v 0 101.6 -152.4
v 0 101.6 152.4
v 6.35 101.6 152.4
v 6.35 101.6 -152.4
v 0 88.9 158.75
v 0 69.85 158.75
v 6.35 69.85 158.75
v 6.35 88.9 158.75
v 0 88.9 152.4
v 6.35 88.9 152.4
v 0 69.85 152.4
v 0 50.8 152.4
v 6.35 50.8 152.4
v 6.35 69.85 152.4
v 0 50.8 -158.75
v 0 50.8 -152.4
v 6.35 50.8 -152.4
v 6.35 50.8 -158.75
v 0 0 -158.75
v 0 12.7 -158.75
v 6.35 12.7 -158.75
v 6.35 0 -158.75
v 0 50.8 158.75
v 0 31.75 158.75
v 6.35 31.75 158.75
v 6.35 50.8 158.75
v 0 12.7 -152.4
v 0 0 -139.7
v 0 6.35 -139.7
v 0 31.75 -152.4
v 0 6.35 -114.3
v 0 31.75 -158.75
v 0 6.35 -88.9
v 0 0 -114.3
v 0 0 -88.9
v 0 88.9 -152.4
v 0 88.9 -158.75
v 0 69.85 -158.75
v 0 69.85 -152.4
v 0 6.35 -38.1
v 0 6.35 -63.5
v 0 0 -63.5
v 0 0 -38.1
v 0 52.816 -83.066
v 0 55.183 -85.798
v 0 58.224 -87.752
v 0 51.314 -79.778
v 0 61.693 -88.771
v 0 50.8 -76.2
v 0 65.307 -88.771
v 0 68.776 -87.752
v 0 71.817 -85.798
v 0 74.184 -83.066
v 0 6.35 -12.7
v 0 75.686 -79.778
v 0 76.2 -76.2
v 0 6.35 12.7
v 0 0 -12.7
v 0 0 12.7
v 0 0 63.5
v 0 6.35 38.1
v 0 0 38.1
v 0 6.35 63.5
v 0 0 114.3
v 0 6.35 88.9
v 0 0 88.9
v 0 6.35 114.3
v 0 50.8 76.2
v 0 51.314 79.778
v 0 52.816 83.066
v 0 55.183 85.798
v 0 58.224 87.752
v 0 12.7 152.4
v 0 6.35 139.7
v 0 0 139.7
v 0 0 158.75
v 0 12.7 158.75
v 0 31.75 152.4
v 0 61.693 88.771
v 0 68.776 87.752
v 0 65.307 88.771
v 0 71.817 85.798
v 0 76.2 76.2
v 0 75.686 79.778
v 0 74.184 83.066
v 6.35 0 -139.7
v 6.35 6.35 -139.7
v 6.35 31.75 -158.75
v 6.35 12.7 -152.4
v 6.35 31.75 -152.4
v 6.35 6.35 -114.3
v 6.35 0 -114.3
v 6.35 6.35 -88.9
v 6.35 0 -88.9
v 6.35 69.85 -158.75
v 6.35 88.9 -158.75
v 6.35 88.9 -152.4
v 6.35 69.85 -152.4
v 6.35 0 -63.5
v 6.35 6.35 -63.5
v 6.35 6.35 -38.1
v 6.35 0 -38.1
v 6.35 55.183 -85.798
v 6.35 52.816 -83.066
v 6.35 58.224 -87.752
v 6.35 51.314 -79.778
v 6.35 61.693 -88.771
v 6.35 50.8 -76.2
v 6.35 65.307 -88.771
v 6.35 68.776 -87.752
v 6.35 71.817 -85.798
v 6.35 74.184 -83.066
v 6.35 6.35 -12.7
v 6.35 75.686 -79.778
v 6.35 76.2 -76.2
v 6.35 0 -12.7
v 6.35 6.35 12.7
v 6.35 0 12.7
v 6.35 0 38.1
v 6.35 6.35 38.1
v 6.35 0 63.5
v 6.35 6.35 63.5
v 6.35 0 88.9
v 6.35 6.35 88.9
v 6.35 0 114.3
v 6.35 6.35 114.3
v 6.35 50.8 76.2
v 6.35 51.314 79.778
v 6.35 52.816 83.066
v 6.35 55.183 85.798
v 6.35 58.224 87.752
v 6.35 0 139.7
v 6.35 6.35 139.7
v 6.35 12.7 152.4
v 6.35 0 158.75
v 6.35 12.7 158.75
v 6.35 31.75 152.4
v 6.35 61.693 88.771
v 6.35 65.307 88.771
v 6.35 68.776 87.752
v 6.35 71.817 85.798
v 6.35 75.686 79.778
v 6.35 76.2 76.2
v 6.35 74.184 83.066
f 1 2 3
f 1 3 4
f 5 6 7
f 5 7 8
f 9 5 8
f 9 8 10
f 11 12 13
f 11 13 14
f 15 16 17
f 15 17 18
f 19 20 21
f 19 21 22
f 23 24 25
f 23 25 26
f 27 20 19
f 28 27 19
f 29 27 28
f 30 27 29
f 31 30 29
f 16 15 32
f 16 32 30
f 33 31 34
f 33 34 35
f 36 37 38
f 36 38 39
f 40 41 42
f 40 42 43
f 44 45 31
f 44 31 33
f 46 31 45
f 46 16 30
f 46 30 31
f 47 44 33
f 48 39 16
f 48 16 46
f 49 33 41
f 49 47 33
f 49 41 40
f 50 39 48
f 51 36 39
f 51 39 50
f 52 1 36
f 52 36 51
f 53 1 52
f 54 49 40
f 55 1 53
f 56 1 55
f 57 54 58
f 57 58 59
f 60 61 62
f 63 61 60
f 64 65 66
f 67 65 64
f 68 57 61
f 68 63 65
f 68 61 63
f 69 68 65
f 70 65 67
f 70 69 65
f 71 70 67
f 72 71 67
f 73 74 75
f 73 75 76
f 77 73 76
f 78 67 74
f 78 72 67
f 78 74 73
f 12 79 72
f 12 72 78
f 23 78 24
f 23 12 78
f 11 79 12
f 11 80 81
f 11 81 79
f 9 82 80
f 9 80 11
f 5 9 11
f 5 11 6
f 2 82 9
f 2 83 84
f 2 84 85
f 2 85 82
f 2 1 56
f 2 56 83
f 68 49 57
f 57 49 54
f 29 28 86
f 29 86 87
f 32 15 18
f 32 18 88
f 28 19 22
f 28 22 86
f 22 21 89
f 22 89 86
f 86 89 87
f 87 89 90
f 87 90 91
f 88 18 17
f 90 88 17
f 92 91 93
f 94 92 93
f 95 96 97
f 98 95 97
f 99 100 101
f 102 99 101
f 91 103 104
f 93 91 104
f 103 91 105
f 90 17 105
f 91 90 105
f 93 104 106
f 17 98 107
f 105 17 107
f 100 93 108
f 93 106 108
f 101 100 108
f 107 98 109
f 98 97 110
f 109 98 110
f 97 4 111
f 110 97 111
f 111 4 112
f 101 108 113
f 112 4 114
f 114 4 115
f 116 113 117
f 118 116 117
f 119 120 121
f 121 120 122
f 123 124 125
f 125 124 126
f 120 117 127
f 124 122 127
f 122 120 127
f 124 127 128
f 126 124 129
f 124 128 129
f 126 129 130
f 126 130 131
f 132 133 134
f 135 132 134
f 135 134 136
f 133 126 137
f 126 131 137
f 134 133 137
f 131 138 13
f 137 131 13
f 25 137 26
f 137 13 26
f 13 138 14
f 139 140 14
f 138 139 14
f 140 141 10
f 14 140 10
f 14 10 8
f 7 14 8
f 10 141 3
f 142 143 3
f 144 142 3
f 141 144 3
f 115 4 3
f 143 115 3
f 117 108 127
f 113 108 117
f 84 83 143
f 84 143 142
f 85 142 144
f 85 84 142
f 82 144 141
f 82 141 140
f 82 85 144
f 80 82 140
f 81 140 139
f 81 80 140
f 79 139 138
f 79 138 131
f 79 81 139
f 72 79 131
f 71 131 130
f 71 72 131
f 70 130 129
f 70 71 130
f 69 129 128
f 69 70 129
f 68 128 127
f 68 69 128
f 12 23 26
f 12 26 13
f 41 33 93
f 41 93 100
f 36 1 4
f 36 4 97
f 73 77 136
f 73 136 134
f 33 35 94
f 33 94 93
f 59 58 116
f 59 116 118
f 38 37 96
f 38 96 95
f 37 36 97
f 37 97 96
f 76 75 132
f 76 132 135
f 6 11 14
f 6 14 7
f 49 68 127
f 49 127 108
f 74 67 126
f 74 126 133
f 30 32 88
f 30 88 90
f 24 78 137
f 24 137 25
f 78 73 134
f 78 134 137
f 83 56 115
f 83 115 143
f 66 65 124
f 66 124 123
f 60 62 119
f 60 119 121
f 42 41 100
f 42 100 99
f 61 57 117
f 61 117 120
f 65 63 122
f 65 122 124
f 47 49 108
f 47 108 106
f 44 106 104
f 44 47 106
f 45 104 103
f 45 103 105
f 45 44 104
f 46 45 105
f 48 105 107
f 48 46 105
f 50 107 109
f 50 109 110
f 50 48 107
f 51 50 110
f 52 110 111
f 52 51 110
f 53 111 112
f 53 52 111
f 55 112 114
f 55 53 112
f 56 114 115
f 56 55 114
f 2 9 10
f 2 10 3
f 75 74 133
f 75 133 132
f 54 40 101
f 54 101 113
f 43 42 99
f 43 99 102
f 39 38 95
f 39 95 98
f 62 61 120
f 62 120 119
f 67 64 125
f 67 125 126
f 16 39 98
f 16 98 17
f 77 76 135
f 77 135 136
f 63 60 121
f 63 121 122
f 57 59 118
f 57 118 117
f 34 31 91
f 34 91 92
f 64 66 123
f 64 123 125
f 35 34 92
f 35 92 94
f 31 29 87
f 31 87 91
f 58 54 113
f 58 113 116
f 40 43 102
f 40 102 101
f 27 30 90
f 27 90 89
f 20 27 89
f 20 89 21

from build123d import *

# Parameters (mm, degrees)
BOSS_EXTRUDE1_DEPTH = 6.35


with BuildPart() as part:
    # Sketch2 → Boss-Extrude1 (new body)
    with BuildSketch(Plane(origin=(0, 0, 0), x_dir=(0, 0, -1), z_dir=(1, 0, 0))):
        Polygon((-152.4, 101.6), (152.4, 101.6), (152.4, 88.9), (158.75, 88.9), (158.75, 69.85), (152.4, 69.85), (152.4, 50.8), (158.75, 50.8), (158.75, 31.75), (152.4, 31.75), (152.4, 12.7), (158.75, 12.7), (158.75, 0), (139.7, 0), (139.7, 6.35), (114.3, 6.35), (114.3, 0), (88.9, 0), (88.9, 6.35), (63.5, 6.35), (63.5, 0), (38.1, 0), (38.1, 6.35), (12.7, 6.35), (12.7, 0), (-12.7, 0), (-12.7, 6.35), (-38.1, 6.35), (-38.1, 0), (-63.5, 0), (-63.5, 6.35), (-88.9, 6.35), (-88.9, 0), (-114.3, 0), (-114.3, 6.35), (-139.7, 6.35), (-139.7, 0), (-158.75, 0), (-158.75, 12.7), (-152.4, 12.7), (-152.4, 31.75), (-158.75, 31.75), (-158.75, 50.8), (-152.4, 50.8), (-152.4, 69.85), (-158.75, 69.85), (-158.75, 88.9), (-152.4, 88.9), align=None)
        with BuildLine():
            Line((-76.2, 50.8), (76.2, 50.8))
            ThreePointArc((76.2, 50.8), (88.9, 63.5), (76.2, 76.2))
            Line((76.2, 76.2), (-76.2, 76.2))
            ThreePointArc((-76.2, 76.2), (-88.9, 63.5), (-76.2, 50.8))
        make_face(mode=Mode.SUBTRACT)
    extrude(amount=BOSS_EXTRUDE1_DEPTH)


solid = part.part
